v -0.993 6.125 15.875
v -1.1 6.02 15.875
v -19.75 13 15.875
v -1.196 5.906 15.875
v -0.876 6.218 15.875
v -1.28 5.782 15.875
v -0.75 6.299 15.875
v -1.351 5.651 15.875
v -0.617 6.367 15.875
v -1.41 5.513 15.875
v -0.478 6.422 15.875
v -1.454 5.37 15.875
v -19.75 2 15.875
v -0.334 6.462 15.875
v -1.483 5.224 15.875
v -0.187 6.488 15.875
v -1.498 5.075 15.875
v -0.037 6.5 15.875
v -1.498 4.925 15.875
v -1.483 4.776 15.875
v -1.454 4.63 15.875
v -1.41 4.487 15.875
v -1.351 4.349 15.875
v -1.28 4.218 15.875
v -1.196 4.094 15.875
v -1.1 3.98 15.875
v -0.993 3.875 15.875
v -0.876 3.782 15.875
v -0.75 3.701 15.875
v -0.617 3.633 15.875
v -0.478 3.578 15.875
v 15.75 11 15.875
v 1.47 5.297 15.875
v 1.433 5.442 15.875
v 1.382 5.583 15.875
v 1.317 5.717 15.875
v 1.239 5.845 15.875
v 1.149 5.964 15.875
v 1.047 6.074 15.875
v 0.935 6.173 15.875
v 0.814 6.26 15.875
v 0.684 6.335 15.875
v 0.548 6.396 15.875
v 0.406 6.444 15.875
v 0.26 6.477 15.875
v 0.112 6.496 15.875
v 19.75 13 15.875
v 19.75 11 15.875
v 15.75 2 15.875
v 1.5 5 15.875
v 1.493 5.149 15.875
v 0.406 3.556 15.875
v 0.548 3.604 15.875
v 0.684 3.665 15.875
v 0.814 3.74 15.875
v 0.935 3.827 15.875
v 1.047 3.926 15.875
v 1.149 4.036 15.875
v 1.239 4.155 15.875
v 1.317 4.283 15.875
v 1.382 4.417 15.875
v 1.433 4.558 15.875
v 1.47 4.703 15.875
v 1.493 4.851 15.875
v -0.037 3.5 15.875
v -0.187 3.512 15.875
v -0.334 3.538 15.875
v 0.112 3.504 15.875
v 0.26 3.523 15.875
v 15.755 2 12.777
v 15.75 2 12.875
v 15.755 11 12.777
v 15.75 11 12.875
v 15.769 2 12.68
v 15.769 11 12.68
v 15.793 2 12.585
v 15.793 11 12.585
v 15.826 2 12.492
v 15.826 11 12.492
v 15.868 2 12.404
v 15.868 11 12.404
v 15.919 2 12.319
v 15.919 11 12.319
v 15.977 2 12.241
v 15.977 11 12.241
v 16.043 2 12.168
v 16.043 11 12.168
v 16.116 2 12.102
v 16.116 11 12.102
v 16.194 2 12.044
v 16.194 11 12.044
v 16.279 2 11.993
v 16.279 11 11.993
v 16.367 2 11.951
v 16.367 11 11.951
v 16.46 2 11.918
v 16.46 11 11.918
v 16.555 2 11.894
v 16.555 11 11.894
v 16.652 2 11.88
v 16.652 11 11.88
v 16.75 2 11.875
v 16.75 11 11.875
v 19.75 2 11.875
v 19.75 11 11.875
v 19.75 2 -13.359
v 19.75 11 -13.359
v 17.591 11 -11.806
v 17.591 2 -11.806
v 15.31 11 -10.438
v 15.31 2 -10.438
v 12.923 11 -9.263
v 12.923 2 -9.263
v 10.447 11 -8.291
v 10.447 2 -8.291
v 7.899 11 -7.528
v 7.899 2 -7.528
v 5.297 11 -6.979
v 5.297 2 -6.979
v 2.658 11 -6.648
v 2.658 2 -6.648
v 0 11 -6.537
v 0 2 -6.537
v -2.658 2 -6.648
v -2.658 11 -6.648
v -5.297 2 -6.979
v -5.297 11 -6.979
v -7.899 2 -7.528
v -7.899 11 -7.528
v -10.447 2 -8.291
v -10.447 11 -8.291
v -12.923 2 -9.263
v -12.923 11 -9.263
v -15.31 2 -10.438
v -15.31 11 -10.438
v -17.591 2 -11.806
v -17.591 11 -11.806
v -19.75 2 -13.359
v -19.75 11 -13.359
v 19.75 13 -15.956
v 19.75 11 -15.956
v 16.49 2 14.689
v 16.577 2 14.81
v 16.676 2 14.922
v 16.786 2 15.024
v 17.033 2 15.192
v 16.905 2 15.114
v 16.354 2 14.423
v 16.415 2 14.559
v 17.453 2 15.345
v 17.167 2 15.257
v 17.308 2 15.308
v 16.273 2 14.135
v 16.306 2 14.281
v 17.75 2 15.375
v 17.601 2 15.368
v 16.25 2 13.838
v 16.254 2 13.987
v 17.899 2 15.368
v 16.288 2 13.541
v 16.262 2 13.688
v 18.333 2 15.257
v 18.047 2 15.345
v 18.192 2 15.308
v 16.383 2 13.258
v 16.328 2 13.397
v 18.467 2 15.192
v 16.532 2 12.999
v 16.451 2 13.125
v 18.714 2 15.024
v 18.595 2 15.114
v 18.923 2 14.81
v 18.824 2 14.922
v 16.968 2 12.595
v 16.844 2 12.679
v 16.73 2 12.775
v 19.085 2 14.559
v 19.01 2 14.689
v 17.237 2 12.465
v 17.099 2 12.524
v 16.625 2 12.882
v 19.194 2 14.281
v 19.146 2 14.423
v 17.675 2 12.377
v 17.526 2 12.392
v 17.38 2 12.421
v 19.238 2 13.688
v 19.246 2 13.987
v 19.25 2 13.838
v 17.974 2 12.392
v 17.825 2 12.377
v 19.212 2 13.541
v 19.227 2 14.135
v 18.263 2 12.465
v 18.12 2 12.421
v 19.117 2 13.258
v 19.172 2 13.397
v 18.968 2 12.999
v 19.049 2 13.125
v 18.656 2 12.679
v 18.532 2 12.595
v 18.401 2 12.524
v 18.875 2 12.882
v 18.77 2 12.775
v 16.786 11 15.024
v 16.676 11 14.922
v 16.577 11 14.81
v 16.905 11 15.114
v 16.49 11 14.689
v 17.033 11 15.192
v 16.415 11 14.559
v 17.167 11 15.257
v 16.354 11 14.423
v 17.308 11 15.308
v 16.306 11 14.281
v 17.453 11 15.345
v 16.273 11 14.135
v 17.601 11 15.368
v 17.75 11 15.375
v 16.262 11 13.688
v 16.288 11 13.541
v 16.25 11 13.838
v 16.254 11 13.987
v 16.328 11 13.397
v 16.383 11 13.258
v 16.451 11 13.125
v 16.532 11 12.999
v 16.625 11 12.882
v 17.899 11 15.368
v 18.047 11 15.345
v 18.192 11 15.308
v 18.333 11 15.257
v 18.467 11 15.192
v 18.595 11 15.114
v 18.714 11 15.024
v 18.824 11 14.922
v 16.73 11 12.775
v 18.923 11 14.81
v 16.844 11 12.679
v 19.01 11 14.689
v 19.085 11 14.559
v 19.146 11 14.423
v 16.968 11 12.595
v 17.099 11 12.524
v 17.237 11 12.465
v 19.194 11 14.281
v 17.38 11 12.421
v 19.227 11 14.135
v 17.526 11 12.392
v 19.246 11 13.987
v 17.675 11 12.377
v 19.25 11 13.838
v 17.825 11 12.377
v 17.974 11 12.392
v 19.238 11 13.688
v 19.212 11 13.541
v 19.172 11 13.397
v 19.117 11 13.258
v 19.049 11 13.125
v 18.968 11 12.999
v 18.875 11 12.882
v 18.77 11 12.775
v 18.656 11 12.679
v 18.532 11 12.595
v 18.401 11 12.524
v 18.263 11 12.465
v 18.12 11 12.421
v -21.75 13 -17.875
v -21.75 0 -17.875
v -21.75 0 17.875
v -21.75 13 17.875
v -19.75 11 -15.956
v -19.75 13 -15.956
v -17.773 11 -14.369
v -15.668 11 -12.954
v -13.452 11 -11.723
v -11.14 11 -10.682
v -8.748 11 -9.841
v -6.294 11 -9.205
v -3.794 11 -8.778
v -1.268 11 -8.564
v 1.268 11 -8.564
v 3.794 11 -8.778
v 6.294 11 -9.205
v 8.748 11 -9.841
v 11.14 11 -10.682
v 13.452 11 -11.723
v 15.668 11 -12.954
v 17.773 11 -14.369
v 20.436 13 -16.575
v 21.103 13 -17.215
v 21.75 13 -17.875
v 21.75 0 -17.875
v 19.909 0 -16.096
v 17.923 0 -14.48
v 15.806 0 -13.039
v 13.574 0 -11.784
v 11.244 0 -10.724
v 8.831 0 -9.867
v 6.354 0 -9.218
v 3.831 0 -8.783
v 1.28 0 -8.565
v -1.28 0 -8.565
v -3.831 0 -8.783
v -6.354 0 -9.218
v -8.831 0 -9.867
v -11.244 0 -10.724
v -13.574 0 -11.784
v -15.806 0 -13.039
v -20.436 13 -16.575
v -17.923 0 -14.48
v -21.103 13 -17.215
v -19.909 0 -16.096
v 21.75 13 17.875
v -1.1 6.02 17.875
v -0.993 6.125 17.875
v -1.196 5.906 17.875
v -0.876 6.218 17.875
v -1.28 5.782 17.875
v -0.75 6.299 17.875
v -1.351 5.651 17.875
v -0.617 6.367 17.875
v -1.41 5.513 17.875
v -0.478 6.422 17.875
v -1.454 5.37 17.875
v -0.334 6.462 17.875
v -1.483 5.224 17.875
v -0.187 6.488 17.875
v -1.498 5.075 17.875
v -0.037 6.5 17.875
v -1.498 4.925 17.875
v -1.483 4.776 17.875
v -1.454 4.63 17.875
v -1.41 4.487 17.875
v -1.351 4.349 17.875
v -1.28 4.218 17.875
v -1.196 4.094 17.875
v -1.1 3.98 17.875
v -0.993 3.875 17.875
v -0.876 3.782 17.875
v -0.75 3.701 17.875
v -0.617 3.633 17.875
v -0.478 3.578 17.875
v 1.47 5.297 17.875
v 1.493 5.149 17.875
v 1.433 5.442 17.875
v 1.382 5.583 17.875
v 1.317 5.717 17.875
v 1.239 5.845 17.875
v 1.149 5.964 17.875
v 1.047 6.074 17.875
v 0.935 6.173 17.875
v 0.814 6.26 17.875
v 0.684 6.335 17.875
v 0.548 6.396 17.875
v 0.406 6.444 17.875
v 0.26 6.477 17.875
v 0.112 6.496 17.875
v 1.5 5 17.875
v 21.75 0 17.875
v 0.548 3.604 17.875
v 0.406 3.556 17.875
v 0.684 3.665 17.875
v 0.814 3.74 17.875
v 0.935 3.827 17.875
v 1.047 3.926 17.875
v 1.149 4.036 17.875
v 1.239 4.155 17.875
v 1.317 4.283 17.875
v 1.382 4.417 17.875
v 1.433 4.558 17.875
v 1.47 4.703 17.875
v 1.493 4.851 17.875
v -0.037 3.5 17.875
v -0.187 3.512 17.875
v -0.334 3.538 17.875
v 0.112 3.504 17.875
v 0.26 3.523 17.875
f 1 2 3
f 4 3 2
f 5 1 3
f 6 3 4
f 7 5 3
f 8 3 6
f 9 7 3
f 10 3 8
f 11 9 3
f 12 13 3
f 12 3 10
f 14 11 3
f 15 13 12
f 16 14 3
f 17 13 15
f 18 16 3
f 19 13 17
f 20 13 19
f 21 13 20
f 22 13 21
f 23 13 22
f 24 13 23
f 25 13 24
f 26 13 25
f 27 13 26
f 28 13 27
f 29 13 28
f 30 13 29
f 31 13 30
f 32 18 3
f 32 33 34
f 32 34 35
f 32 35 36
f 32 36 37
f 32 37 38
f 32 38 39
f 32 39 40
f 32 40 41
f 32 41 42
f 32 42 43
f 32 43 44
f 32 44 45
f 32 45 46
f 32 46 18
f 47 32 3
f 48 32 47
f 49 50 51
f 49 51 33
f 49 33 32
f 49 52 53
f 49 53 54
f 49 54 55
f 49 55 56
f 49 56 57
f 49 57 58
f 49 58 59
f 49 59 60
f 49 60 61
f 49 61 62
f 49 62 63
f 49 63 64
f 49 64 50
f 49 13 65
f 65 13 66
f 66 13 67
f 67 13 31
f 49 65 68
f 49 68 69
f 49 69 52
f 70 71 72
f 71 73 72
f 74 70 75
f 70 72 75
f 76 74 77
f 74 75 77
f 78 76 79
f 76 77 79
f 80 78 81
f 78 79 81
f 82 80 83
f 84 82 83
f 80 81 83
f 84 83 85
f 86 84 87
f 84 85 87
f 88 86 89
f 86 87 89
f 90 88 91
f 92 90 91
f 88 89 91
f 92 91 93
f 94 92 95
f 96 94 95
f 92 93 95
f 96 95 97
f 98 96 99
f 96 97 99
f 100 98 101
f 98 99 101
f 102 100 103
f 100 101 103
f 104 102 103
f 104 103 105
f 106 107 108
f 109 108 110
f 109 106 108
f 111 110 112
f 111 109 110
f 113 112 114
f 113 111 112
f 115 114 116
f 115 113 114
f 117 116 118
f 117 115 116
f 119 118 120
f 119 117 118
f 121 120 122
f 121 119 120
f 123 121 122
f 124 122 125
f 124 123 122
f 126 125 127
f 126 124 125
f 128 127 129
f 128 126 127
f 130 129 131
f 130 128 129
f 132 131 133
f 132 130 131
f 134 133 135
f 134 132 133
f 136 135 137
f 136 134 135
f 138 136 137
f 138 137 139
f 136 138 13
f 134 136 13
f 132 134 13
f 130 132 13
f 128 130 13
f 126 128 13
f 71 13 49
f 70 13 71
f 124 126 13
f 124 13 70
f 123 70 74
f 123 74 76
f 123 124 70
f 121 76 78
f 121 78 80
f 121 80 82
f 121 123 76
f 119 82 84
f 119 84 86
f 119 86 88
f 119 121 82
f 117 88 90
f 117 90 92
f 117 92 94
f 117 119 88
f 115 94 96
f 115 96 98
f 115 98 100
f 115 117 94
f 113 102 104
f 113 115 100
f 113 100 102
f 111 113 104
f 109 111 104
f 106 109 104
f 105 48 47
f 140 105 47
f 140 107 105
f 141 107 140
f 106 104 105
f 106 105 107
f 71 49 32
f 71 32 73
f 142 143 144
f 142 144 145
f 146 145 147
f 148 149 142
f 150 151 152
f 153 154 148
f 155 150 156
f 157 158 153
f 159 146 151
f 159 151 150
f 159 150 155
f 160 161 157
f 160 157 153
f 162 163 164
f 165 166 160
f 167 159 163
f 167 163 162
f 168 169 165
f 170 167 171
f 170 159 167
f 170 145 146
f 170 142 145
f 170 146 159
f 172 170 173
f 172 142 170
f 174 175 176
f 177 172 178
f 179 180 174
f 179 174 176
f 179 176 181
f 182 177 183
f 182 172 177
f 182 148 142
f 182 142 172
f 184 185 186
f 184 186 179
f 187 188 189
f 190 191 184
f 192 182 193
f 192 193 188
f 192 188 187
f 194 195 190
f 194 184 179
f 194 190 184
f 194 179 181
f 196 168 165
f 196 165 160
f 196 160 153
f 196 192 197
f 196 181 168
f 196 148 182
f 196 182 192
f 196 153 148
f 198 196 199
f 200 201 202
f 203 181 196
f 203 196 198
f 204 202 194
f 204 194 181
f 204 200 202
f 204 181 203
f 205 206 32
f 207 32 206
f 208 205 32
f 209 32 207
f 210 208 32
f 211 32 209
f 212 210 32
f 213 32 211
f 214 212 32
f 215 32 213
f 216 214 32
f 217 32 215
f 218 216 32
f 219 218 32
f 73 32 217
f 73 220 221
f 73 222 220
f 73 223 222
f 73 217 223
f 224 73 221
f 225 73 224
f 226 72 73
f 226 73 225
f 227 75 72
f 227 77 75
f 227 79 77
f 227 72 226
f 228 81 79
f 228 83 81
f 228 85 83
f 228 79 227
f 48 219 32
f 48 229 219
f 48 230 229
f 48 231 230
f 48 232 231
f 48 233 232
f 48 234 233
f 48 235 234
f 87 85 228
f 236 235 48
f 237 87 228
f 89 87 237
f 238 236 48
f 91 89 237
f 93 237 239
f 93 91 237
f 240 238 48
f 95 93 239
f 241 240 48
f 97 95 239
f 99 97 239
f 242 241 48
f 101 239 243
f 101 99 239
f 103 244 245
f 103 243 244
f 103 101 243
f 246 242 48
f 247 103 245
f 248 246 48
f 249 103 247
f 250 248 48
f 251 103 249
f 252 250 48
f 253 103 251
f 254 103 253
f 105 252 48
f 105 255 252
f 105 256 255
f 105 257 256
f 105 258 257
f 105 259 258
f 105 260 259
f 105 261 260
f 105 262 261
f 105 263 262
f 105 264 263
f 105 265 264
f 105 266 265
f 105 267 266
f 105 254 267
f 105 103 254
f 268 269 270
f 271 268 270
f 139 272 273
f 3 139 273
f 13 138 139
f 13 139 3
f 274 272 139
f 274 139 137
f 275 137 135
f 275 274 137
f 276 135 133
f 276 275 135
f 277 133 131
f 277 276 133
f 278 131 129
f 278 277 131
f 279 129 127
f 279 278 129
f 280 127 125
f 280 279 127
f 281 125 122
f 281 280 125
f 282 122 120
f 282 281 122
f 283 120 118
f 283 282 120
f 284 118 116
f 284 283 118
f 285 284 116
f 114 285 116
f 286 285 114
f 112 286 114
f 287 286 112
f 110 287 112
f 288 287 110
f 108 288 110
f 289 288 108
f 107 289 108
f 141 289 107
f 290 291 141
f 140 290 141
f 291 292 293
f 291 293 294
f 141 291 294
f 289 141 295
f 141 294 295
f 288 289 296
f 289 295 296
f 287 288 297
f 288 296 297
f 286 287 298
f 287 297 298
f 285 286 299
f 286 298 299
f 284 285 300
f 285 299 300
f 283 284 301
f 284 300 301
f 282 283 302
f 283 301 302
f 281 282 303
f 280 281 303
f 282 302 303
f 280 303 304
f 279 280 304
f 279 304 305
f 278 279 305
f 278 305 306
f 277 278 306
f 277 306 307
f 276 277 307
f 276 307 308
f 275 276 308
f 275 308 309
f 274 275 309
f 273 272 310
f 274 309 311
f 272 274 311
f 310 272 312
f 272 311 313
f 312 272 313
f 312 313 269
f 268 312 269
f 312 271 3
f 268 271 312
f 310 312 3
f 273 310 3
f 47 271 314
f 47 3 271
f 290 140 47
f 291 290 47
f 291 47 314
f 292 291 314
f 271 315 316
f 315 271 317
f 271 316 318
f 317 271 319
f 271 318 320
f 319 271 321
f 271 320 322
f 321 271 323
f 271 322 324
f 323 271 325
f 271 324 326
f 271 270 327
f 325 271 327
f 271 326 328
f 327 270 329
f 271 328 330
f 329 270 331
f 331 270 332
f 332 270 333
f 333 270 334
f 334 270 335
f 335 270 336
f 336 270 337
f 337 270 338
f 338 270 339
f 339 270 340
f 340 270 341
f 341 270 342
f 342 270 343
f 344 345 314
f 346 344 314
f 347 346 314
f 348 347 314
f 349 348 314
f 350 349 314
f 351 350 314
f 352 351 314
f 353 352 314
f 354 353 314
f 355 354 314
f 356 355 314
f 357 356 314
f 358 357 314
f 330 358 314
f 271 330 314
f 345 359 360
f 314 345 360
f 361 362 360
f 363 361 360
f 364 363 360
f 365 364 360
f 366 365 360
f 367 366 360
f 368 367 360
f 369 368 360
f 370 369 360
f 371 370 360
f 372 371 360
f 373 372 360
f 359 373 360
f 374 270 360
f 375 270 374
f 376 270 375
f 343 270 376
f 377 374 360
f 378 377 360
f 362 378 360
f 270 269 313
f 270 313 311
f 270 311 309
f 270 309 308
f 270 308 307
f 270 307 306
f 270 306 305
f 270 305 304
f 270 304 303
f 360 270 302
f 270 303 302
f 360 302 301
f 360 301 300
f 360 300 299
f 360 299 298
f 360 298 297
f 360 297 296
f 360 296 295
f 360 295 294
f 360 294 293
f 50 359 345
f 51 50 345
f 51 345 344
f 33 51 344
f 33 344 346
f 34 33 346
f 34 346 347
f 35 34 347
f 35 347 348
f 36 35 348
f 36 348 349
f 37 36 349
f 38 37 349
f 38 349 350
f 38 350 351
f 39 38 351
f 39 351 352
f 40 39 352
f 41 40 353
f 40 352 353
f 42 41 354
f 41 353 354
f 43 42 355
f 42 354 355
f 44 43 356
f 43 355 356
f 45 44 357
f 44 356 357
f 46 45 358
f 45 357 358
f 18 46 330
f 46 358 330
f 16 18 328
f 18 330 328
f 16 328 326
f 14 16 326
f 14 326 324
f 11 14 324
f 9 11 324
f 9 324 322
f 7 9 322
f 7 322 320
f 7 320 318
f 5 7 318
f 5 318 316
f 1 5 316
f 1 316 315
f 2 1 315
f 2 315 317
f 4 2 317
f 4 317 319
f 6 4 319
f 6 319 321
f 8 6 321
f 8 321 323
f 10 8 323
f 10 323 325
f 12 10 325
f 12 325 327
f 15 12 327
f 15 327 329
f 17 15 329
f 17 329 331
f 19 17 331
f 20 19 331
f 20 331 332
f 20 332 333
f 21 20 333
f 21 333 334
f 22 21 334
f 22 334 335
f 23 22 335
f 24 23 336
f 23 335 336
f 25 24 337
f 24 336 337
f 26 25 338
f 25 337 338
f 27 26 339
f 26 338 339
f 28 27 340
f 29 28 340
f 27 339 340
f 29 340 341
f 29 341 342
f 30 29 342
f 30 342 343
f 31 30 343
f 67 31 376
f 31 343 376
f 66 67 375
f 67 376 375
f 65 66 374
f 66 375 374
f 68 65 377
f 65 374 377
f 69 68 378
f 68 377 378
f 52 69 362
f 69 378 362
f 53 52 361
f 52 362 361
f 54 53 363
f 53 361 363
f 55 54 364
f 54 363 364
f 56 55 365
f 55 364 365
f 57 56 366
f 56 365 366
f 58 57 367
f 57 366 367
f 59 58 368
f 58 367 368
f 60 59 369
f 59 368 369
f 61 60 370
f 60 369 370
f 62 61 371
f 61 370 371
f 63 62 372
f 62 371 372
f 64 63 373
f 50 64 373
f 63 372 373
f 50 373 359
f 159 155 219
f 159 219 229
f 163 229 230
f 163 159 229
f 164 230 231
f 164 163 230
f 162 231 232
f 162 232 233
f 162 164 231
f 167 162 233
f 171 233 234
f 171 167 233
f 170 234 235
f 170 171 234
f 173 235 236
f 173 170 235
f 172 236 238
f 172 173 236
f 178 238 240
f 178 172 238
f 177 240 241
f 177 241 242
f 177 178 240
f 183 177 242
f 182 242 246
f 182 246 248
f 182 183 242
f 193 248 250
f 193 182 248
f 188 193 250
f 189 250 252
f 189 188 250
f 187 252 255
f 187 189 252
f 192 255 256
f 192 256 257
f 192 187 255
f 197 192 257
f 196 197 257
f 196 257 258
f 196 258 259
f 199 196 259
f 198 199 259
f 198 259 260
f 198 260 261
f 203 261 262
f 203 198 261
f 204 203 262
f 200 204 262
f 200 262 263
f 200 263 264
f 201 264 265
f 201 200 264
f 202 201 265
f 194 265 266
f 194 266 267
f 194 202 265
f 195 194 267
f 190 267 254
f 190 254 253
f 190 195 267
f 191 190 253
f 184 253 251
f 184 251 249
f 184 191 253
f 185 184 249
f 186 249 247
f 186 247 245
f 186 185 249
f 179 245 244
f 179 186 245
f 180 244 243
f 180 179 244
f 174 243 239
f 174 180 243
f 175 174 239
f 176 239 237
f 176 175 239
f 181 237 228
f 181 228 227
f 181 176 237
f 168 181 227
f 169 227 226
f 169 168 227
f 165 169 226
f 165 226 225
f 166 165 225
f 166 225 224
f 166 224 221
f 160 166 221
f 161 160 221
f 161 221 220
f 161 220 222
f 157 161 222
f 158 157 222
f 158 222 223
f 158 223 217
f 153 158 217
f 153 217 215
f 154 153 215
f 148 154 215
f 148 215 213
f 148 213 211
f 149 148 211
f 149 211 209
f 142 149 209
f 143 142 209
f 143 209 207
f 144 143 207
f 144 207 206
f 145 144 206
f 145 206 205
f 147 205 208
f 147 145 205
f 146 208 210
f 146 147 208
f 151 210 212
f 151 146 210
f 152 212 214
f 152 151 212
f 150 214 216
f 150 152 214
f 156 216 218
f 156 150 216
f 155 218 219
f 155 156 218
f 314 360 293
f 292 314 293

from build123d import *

# Parameters (mm, degrees)
BOSS_EXTRUDE1_DEPTH = 13
SHELL1_T            = -2
CUT_EXTRUDE1_START  = -2
CUT_EXTRUDE1_DEPTH  = 2
CUT_EXTRUDE2_REACH  = 45.819
SKETCH3_R           = 1.5
SKETCH4_W           = 4
SKETCH4_H           = 4
SKETCH4_R           = 1.5
BOSS_EXTRUDE2_DEPTH = 9
FILLET1_R           = 1


with BuildPart() as part:
    # Sketch1 → Boss-Extrude1 (new body)
    with BuildSketch(Plane(origin=(0, 0, 0), x_dir=(1, 0, 0), z_dir=(0, 1, 0))):
        with BuildLine():
            ThreePointArc((21.75, 17.875), (0, 8.537465971), (-21.75, 17.875))
            Line((-21.75, 17.875), (-21.75, -17.875))
            Line((-21.75, -17.875), (21.75, -17.875))
            Line((21.75, -17.875), (21.75, 17.875))
        make_face()
    extrude(amount=BOSS_EXTRUDE1_DEPTH)

    # Shell1
    shell1_openings = [part.faces().sort_by_distance(p)[0] for p in [
        (0, 13, 3.099956695),
    ]]
    offset(amount=SHELL1_T, openings=shell1_openings, kind=Kind.INTERSECTION)

    # Sketch2 → Cut-Extrude1 (cut)
    with BuildSketch(Plane(origin=(0, 13, 0), x_dir=(1, 0, 0), z_dir=(0, 1, 0)).offset(CUT_EXTRUDE1_START)):
        with BuildLine():
            ThreePointArc((19.75, 15.955670205), (0, 8.537465971), (-19.75, 15.955670205))
            Line((-19.75, 15.955670205), (-19.75, 13.359350474))
            ThreePointArc((-19.75, 13.359350474), (0, 6.537465971), (19.75, 13.359350474))
            Line((19.75, 13.359350474), (19.75, 15.955670205))
        make_face()
    extrude(amount=CUT_EXTRUDE1_DEPTH, mode=Mode.SUBTRACT)

    # Sketch3 → Cut-Extrude2 (cut, up to next)
    with BuildSketch(Plane.XY.offset(17.875), mode=Mode.PRIVATE) as cut_extrude2_sk1:
        with Locations((0, 5)):
            Circle(SKETCH3_R)
    cut_extrude2_tool1 = extrude(cut_extrude2_sk1.sketch, amount=-CUT_EXTRUDE2_REACH, mode=Mode.PRIVATE) & part.part
    add(cut_extrude2_tool1.solids().sort_by_distance((0, 5, 17.875))[0], mode=Mode.SUBTRACT)

    # Sketch4 → Boss-Extrude2 (add)
    with BuildSketch(Plane(origin=(0, 2, 0), x_dir=(1, 0, 0), z_dir=(0, 1, 0))):
        with Locations((17.75, -13.875)):
            Rectangle(SKETCH4_W, SKETCH4_H)
        with Locations(Location((17.75, -13.875, 0), (0, 0, 270))):
            Circle(SKETCH4_R, mode=Mode.SUBTRACT)
    extrude(amount=BOSS_EXTRUDE2_DEPTH)

    # Fillet1
    fillet1_edges = [part.edges().sort_by_distance(p)[0] for p in [
        (15.75, 6.5, 11.875),
    ]]
    fillet(fillet1_edges, radius=FILLET1_R)


solid = part.part
